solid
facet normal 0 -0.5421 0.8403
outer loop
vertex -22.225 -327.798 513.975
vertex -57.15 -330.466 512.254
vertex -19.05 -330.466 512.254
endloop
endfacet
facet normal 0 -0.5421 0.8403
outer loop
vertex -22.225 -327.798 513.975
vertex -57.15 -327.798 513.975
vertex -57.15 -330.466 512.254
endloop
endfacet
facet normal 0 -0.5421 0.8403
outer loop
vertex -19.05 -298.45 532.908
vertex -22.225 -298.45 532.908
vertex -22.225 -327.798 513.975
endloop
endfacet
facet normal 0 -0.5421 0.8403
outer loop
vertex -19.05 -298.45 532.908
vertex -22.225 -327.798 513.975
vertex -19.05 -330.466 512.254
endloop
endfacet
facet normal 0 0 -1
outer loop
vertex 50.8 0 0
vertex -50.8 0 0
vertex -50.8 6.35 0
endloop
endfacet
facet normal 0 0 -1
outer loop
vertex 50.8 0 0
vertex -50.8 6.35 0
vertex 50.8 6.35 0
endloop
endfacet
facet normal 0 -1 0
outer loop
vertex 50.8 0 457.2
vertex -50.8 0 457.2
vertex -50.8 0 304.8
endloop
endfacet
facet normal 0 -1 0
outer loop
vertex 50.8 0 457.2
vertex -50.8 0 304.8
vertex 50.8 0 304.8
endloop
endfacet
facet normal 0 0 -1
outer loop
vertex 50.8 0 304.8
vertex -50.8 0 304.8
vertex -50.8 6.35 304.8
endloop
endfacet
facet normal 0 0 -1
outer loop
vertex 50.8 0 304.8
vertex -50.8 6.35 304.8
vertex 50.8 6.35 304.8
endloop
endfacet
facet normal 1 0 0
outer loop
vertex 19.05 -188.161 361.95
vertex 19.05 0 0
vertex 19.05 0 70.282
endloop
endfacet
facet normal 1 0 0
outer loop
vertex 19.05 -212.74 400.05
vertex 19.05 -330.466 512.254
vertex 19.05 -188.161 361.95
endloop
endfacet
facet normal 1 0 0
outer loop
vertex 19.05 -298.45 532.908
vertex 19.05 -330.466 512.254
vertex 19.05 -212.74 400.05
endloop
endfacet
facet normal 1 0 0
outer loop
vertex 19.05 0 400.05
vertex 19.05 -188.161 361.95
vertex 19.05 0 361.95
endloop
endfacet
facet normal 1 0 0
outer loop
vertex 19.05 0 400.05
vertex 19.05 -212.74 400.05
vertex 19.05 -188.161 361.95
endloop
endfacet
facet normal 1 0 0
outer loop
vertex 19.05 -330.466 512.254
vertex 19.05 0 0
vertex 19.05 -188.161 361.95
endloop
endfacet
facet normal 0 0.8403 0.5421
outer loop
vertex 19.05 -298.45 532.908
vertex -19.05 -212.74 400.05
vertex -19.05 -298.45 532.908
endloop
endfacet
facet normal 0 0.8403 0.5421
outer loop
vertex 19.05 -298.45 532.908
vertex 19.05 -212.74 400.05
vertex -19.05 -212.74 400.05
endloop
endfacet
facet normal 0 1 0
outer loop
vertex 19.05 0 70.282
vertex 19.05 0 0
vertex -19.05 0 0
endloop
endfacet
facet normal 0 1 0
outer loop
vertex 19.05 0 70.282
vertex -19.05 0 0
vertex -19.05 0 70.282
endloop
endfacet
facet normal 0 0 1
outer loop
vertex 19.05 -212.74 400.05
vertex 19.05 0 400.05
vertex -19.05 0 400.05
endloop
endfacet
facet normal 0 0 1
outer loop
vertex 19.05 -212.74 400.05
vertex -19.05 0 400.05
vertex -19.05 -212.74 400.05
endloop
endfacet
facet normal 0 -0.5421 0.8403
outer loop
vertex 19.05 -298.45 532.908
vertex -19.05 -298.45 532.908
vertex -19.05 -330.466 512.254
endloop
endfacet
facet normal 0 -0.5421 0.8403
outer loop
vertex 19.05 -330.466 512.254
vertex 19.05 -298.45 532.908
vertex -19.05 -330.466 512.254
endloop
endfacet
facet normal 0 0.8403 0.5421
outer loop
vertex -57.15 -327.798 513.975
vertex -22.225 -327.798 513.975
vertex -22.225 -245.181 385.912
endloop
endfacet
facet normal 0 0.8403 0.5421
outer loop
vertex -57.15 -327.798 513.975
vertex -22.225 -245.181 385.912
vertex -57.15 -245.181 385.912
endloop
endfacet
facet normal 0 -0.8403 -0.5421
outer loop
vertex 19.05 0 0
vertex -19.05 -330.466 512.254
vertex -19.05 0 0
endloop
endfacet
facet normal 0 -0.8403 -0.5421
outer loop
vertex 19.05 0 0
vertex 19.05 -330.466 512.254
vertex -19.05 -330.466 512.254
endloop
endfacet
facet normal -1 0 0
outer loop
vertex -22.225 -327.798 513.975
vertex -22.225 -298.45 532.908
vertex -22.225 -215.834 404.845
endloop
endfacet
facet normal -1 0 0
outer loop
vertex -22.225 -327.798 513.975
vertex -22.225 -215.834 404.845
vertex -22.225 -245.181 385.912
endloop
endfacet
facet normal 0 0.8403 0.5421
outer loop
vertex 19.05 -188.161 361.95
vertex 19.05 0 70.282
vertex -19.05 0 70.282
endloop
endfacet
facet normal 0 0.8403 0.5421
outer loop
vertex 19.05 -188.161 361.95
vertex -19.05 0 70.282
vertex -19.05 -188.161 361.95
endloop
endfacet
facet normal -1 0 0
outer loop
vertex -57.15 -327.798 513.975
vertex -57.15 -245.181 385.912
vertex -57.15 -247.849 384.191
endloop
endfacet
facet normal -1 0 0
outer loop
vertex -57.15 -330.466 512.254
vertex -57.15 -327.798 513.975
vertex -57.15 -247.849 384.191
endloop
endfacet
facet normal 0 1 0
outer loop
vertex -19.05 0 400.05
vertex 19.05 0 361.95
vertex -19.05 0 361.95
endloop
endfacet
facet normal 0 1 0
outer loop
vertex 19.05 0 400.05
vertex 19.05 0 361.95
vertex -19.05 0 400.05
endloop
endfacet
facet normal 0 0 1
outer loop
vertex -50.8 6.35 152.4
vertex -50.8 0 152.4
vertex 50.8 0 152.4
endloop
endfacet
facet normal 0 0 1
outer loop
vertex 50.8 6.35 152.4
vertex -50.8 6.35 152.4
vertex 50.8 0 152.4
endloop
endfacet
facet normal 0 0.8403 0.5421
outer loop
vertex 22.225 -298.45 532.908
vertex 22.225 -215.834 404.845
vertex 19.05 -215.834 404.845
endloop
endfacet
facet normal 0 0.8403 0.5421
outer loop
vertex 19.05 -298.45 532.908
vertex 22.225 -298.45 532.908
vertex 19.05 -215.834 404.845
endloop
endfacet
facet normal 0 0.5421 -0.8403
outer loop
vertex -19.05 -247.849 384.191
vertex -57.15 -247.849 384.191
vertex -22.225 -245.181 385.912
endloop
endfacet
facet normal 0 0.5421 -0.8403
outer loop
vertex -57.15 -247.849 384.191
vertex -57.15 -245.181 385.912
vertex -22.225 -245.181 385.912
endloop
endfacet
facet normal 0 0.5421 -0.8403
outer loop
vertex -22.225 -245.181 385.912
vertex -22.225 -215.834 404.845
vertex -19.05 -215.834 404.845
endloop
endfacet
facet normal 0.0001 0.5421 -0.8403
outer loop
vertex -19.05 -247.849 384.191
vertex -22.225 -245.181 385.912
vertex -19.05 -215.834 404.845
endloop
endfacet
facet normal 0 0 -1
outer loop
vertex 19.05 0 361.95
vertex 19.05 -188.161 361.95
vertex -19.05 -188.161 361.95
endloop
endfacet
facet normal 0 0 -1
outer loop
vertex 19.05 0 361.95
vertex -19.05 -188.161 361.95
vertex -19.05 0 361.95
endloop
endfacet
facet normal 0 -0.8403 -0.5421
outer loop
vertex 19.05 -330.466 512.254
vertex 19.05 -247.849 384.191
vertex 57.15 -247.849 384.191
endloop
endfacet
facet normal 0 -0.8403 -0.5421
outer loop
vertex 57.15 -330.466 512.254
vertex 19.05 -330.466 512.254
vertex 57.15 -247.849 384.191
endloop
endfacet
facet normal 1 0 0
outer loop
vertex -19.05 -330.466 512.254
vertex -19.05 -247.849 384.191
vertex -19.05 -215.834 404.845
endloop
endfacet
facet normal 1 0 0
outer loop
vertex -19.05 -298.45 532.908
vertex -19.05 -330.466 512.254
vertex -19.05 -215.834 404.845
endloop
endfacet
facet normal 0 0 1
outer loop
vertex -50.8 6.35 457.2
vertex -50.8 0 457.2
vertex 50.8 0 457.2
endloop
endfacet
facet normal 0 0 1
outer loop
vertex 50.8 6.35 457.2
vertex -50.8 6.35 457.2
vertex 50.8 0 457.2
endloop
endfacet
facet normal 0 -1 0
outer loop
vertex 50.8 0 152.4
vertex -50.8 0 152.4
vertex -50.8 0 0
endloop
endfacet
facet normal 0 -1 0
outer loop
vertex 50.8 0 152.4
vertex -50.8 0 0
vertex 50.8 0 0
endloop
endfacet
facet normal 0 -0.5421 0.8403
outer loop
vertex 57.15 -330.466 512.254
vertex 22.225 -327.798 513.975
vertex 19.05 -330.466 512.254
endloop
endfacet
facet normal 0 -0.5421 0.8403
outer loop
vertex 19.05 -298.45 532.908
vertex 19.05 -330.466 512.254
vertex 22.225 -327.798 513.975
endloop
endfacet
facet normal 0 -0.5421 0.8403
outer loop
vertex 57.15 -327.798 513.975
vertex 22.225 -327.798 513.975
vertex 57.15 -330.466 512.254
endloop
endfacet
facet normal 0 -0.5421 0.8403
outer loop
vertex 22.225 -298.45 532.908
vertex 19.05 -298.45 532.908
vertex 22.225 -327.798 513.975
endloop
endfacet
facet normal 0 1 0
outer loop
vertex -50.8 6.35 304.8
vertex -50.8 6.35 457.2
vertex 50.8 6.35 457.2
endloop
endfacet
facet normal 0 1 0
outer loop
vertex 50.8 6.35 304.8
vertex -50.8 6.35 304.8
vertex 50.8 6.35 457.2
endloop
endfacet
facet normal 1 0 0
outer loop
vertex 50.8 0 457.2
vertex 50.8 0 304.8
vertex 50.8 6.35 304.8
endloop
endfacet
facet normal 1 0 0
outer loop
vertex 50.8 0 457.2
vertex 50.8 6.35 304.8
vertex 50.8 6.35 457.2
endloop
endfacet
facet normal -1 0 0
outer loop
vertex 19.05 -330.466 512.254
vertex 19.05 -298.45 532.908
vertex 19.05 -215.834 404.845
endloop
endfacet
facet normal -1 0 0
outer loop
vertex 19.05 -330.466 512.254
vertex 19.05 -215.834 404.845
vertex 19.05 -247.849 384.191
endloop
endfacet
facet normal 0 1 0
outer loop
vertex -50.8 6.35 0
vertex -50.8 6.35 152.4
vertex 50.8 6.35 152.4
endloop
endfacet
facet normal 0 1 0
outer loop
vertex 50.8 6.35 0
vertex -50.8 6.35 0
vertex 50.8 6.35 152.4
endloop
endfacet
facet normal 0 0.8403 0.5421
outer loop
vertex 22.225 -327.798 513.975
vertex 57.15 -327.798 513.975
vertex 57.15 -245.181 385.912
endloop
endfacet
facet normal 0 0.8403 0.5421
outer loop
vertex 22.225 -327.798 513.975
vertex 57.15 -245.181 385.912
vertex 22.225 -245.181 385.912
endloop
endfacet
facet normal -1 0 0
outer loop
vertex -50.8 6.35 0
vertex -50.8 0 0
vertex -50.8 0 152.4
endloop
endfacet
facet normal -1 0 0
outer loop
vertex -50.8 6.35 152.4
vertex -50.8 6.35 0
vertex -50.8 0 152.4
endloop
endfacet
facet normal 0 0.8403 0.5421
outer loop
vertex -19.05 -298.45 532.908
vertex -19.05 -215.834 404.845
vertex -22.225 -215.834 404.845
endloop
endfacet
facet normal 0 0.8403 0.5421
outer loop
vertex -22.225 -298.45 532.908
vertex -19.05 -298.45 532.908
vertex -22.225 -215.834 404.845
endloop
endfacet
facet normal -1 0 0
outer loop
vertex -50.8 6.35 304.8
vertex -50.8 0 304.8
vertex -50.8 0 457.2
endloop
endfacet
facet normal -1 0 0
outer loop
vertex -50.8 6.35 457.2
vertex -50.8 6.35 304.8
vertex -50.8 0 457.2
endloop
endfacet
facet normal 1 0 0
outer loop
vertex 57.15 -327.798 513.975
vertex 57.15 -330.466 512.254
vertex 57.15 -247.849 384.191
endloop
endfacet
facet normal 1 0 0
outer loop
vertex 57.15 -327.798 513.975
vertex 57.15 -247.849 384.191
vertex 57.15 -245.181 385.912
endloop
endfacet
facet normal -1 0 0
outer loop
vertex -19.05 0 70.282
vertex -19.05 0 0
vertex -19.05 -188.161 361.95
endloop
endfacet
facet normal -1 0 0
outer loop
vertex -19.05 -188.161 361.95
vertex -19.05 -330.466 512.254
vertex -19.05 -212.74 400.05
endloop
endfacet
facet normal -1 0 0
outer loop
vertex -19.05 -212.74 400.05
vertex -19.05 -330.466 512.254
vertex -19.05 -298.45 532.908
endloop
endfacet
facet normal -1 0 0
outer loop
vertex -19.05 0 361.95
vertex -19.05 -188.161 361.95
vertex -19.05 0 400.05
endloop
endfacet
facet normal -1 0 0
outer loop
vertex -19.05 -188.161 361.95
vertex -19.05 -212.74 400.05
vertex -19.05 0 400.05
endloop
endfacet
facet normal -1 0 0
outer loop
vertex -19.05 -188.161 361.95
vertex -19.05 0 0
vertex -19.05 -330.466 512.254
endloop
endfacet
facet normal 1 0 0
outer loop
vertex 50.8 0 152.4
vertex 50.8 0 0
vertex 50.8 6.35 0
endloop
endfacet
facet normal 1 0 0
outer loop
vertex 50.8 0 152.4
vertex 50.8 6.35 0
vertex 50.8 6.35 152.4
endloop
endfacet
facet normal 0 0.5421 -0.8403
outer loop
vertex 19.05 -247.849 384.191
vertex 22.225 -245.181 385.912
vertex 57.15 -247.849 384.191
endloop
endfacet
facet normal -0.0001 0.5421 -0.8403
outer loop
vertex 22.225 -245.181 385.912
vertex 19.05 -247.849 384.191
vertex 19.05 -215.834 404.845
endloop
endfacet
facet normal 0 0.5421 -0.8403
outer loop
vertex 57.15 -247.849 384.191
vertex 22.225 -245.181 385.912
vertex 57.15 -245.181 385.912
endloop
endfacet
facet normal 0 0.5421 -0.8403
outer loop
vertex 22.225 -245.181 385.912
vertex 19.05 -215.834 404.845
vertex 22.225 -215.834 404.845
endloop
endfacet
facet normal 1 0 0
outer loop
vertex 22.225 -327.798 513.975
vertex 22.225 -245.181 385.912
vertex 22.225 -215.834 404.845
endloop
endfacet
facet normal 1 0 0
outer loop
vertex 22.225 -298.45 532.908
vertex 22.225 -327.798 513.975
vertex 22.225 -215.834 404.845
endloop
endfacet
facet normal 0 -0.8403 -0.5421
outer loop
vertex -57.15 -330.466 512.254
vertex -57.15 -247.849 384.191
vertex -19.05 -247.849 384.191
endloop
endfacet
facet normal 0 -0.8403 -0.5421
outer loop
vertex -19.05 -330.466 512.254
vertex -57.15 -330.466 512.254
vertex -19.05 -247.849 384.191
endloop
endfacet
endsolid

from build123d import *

# Parameters (mm, degrees)
F0_W     = 101.6
F0_H     = 152.4
F1_DEPTH = 6.35
F3_DEPTH = 19.05
F5_DEPTH = 152.4


with BuildPart() as f1:
    # F0 (on Front) → F1 (new body)
    with BuildSketch(Plane.XZ):
        with Locations((0, 381)):
            Rectangle(F0_W, F0_H)
        with Locations((0, 76.2)):
            Rectangle(F0_W, F0_H)
    extrude(amount=-F1_DEPTH)


with BuildPart() as f3:
    # F2 (on Right) → F3 (new body, symmetric)
    with BuildSketch(Plane.YZ):
        Polygon((-330.465893, 512.254286), (0, 0), (0, 70.281867), (-188.161178, 361.95), (-200.450729, 381), (-212.74028, 400.05), (-298.45, 532.908404), align=None)
        Polygon((-212.74028, 400.05), (-200.450729, 381), (0, 381), (0, 400.05), align=None)
        Polygon((-200.450729, 381), (-188.161178, 361.95), (0, 361.95), (0, 381), align=None)
    extrude(amount=F3_DEPTH, both=True)


with BuildPart() as f5:
    # F4 (on face) → F5 (new body)
    with BuildSketch(Plane(origin=(0, -330.465893, 512.254286), x_dir=(1, 0, 0), z_dir=(0, -0.542103, 0.840312))):
        Polygon((-57.15, 0), (-19.05, 0), (-19.05, 38.1), (-22.225, 38.1), (-22.225, 3.175), (-57.15, 3.175), align=None)
        Polygon((19.05, 38.1), (19.05, 0), (57.15, 0), (57.15, 3.175), (22.225, 3.175), (22.225, 38.1), align=None)
    extrude(amount=-F5_DEPTH)


solid = Compound([f1.part, f3.part, f5.part])
